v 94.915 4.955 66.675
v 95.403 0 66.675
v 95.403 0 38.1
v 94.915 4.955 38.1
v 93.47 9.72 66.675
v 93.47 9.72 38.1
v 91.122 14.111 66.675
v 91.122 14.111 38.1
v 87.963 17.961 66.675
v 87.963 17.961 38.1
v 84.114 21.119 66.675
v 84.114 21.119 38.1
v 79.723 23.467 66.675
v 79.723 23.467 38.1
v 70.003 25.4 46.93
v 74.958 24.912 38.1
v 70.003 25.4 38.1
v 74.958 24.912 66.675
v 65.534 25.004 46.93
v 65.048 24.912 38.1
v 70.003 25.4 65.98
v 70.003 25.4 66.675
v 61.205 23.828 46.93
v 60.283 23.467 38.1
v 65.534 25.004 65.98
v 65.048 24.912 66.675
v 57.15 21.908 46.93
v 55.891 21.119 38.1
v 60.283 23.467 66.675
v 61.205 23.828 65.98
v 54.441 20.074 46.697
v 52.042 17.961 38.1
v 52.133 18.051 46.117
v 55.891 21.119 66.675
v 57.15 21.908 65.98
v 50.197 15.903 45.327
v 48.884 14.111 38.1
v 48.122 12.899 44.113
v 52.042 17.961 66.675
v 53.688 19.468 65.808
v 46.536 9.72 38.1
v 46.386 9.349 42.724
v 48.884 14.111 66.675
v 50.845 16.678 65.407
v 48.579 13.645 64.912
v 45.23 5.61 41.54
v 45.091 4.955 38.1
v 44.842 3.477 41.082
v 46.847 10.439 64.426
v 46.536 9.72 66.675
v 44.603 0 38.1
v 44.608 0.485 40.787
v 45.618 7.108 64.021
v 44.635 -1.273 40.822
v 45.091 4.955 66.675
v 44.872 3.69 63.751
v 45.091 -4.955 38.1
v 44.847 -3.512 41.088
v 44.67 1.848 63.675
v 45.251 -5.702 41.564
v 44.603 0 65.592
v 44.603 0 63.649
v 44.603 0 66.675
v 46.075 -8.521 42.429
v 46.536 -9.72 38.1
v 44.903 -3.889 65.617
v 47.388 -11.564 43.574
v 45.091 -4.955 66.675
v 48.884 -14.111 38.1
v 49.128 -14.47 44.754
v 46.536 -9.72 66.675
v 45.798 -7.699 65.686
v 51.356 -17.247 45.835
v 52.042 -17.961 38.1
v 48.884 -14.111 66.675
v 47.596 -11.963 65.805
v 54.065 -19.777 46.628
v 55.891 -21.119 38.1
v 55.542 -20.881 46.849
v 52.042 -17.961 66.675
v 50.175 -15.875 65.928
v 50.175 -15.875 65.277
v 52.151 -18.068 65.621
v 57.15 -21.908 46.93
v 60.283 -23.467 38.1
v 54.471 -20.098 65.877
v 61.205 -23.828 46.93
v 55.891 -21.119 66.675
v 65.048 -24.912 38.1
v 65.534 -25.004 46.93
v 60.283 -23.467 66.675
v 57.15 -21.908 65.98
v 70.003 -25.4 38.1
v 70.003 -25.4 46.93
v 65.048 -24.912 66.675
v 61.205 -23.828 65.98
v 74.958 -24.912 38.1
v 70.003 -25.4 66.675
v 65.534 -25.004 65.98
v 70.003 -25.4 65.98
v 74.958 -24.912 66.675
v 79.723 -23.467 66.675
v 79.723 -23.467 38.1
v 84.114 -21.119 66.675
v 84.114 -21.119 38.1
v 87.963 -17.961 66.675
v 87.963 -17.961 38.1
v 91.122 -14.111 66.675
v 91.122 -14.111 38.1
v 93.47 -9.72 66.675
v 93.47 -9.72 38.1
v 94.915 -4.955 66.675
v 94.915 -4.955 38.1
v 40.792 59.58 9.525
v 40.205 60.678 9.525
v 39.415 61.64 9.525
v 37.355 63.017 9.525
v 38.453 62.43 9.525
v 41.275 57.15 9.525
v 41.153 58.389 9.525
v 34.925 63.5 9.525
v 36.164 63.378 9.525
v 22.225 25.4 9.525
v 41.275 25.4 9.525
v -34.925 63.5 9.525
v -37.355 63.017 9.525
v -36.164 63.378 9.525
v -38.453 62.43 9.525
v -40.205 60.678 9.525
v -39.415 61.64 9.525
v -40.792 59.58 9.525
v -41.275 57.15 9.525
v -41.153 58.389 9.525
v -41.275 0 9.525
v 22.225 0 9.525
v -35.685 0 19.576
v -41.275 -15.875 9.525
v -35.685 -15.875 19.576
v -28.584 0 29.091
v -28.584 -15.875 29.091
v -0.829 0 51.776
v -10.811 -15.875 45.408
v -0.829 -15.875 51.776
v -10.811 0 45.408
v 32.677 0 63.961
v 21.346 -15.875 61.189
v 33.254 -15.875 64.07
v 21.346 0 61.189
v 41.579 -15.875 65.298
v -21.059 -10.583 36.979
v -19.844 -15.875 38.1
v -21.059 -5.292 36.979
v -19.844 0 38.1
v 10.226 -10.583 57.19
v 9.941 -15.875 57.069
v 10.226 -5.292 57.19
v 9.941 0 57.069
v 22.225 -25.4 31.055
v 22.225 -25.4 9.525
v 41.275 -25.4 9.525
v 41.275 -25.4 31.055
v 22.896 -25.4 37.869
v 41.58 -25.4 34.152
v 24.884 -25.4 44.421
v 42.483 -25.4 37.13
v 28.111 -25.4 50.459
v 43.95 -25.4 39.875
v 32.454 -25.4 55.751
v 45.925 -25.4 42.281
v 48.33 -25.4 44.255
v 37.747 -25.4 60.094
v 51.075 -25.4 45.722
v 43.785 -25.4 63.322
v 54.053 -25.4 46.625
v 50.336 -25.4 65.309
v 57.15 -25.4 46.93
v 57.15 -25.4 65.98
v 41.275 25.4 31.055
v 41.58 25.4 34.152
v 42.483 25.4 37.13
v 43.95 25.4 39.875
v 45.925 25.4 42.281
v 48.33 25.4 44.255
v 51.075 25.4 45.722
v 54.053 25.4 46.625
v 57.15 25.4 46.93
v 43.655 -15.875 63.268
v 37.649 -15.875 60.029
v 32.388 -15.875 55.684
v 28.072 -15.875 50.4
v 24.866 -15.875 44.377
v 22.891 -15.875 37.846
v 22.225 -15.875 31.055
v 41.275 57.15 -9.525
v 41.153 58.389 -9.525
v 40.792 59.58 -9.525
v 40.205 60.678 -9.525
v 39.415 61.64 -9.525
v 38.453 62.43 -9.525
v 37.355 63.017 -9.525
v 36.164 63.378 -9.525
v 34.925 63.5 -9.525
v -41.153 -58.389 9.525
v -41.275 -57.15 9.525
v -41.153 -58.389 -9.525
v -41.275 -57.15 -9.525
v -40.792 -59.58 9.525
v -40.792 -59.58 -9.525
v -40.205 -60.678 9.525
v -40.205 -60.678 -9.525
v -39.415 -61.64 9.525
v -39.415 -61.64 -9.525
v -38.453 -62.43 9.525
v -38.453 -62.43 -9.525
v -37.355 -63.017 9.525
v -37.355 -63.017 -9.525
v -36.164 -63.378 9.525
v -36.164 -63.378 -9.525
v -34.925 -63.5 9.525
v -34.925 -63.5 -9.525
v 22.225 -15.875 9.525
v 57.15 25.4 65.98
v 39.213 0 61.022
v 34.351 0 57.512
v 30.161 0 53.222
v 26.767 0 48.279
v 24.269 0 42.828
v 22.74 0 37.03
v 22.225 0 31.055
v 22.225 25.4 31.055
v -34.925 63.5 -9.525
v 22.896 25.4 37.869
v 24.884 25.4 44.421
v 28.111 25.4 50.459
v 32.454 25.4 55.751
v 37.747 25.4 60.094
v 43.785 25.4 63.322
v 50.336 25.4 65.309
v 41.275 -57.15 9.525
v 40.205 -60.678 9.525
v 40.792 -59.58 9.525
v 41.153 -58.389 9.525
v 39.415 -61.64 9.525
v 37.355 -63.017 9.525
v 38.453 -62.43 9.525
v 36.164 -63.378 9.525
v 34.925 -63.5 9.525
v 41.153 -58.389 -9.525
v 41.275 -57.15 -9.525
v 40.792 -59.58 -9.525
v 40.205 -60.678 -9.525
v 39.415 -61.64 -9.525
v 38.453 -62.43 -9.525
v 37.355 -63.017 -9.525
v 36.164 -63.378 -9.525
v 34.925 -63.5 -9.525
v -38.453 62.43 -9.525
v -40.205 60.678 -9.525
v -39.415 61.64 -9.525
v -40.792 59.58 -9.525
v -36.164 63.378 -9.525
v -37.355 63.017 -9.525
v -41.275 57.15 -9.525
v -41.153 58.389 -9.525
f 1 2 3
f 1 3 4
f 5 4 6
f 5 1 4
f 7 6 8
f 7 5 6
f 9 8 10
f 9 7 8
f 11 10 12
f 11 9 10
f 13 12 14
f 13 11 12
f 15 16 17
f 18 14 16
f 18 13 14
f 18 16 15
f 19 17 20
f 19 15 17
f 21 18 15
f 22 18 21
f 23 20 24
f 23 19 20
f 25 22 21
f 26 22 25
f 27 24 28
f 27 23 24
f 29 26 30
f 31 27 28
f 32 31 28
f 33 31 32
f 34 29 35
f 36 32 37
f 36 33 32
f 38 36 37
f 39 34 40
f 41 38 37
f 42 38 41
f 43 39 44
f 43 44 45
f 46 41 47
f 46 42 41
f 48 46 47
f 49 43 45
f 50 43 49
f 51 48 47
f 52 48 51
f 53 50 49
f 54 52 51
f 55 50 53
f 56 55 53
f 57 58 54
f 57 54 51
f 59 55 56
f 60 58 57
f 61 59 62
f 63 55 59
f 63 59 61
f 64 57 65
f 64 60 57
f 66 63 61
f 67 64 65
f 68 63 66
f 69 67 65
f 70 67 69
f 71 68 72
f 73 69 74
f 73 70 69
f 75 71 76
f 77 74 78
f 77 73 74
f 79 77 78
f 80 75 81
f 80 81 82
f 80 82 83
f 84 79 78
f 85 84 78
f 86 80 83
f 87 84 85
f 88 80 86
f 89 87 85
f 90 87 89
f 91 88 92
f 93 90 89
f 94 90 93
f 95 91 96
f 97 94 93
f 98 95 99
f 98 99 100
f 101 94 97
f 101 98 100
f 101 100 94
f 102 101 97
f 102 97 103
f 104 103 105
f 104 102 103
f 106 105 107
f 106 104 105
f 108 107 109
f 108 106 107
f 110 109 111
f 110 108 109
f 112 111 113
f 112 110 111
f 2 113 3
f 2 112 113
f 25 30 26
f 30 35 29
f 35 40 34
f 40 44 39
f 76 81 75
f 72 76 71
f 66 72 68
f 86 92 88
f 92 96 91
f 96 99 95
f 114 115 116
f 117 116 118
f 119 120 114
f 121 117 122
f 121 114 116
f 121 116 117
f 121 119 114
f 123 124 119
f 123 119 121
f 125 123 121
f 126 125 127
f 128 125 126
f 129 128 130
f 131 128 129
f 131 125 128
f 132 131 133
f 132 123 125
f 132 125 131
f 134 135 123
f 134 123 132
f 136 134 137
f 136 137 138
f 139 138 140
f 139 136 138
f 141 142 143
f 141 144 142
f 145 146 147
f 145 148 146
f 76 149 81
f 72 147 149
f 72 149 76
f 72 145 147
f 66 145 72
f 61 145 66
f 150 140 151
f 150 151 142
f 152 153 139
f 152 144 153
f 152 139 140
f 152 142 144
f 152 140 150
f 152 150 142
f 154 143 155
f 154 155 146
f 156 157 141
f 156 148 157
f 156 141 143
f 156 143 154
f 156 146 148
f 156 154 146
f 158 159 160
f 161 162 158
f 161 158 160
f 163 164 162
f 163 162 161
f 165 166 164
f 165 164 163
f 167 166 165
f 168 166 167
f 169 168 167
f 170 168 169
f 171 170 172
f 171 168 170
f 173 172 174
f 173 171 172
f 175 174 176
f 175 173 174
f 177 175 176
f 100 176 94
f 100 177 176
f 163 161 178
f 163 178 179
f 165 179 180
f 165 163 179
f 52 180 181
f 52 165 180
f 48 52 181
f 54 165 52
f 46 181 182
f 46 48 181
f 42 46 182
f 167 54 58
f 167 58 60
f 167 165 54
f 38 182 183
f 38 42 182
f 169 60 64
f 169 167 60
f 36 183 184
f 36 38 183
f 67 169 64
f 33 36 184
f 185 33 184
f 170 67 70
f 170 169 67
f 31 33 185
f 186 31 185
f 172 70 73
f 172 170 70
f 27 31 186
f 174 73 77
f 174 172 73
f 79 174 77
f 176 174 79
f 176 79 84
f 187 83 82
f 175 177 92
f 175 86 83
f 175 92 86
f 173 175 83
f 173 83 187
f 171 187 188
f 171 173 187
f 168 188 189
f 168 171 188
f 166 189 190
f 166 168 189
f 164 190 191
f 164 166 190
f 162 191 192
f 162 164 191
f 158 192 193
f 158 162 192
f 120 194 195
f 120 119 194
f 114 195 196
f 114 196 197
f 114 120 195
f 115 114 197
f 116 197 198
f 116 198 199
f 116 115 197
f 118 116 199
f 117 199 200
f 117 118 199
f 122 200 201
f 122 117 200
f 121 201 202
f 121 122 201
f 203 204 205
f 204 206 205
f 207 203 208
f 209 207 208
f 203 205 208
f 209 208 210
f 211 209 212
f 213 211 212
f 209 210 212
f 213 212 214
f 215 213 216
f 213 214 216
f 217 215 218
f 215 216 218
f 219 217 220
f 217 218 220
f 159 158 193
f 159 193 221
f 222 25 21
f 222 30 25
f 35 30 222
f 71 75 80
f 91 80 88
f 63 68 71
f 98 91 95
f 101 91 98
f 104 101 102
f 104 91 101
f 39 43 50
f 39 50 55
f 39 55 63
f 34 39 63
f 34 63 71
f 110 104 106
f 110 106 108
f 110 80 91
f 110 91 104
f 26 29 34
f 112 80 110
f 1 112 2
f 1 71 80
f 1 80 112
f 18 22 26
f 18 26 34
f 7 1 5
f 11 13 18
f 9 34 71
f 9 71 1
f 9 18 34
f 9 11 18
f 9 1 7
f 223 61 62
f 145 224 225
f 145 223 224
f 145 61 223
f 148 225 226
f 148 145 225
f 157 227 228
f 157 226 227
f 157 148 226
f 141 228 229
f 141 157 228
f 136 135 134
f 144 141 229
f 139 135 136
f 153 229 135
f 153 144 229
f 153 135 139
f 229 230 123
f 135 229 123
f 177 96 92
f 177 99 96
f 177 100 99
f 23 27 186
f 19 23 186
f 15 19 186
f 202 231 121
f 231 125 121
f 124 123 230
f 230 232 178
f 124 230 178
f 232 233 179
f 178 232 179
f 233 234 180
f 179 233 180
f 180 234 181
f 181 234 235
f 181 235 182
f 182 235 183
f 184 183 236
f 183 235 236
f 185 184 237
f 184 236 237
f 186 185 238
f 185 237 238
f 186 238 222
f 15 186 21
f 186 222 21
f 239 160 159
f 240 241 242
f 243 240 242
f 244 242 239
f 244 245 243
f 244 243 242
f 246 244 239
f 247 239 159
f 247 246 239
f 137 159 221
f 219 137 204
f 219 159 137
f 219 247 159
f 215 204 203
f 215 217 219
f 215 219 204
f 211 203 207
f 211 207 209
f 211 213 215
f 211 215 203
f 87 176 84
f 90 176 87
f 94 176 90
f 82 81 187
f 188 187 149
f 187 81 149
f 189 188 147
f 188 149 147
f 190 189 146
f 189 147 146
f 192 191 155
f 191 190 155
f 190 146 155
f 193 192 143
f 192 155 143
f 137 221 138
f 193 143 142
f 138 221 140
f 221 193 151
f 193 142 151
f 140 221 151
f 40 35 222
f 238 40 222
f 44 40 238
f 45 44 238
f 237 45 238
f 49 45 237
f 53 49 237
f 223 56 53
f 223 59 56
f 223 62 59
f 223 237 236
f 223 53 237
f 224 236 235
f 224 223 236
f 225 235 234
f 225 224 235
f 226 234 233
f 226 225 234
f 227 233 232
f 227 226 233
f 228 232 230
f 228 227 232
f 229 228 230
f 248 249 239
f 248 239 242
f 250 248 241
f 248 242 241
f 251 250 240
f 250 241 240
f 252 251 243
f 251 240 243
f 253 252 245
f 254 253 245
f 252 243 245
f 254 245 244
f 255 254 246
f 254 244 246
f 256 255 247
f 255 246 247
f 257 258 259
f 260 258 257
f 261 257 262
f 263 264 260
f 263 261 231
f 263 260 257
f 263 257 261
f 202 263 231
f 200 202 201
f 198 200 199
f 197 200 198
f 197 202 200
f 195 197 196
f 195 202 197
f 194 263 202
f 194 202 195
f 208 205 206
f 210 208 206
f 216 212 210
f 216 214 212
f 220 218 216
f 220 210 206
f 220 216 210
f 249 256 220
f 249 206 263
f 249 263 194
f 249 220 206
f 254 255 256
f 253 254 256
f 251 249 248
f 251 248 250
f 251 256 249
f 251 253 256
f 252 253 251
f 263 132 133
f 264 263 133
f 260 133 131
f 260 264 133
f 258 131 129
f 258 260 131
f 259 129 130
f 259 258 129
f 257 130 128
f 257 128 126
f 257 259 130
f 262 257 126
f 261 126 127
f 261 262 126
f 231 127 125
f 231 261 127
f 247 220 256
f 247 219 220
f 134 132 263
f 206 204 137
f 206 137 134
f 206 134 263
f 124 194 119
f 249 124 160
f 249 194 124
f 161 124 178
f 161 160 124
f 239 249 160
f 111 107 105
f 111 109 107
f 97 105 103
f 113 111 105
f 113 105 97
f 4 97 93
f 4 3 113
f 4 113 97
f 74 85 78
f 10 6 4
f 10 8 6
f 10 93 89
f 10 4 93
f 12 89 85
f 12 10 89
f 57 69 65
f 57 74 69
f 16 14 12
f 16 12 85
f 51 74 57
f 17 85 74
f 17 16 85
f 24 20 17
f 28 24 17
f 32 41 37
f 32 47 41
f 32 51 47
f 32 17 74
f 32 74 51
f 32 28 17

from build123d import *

# Parameters (mm, degrees)
F1_DEPTH = 63.5
F2_DEPTH = 25.4
F3_DEPTH = 15.875
F5_R     = 6.35


with BuildPart() as f1:
    # F0 (on Front) → F1 (new body, symmetric)
    with BuildSketch(Plane.XZ):
        Polygon((-41.275, -9.525), (41.275, -9.525), (41.275, 9.525), (22.225, 9.525), (-41.275, 9.525), align=None)
    extrude(amount=F1_DEPTH, both=True)

    # F0 (on Front) → F2 (join, symmetric)
    with BuildSketch(Plane.XZ):
        with BuildLine():
            Line((22.225, 9.525), (41.275, 9.525))
            Line((41.275, 9.525), (41.275, 31.055324))
            ThreePointArc((41.275, 31.055324), (45.92468, 42.280644), (57.15, 46.930324))
            Line((57.15, 46.930324), (70.002963, 46.930324))
            Line((70.002963, 46.930324), (70.002963, 65.980324))
            Line((70.002963, 65.980324), (57.15, 65.980324))
            ThreePointArc((57.15, 65.980324), (32.454296, 55.751029), (22.225, 31.055324))
            Line((22.225, 31.055324), (22.225, 9.525))
        make_face()
    extrude(amount=F2_DEPTH, both=True)

    # F0 (on Front) → F3 (join)
    with BuildSketch(Plane.XZ):
        with BuildLine():
            add(Edge.make_bspline(
                [(-41.275, 9.525), (-26.659947, 40.76108), (10.355518, 66.98136), (57.15, 65.980324)],
                knots=[0, 0, 0, 0, 113.466666, 113.466666, 113.466666, 113.466666], degree=3))
            Line((-41.275, 9.525), (22.225, 9.525))
            Line((22.225, 9.525), (22.225, 31.055324))
            ThreePointArc((22.225, 31.055324), (32.454296, 55.751029), (57.15, 65.980324))
        make_face()
    extrude(amount=F3_DEPTH)

    # F0 (on Front) → F4 (revolve)
    with BuildSketch(Plane.XZ):
        Polygon((70.002963, 66.675), (70.002963, 65.980324), (70.002963, 46.930324), (70.002963, 38.1), (95.402963, 38.1), (95.402963, 66.675), align=None)
    revolve(axis=Axis((70.002963, 0, 52.3875), (0, 0, 1)))

    # F5
    f5_edges = [f1.edges().sort_by_distance(p)[0] for p in [
        (-41.275, -63.5, 0),
        (41.275, -63.5, 0),
        (-41.275, 63.5, 0),
        (41.275, 63.5, 0),
    ]]
    fillet(f5_edges, radius=F5_R)


solid = f1.part
